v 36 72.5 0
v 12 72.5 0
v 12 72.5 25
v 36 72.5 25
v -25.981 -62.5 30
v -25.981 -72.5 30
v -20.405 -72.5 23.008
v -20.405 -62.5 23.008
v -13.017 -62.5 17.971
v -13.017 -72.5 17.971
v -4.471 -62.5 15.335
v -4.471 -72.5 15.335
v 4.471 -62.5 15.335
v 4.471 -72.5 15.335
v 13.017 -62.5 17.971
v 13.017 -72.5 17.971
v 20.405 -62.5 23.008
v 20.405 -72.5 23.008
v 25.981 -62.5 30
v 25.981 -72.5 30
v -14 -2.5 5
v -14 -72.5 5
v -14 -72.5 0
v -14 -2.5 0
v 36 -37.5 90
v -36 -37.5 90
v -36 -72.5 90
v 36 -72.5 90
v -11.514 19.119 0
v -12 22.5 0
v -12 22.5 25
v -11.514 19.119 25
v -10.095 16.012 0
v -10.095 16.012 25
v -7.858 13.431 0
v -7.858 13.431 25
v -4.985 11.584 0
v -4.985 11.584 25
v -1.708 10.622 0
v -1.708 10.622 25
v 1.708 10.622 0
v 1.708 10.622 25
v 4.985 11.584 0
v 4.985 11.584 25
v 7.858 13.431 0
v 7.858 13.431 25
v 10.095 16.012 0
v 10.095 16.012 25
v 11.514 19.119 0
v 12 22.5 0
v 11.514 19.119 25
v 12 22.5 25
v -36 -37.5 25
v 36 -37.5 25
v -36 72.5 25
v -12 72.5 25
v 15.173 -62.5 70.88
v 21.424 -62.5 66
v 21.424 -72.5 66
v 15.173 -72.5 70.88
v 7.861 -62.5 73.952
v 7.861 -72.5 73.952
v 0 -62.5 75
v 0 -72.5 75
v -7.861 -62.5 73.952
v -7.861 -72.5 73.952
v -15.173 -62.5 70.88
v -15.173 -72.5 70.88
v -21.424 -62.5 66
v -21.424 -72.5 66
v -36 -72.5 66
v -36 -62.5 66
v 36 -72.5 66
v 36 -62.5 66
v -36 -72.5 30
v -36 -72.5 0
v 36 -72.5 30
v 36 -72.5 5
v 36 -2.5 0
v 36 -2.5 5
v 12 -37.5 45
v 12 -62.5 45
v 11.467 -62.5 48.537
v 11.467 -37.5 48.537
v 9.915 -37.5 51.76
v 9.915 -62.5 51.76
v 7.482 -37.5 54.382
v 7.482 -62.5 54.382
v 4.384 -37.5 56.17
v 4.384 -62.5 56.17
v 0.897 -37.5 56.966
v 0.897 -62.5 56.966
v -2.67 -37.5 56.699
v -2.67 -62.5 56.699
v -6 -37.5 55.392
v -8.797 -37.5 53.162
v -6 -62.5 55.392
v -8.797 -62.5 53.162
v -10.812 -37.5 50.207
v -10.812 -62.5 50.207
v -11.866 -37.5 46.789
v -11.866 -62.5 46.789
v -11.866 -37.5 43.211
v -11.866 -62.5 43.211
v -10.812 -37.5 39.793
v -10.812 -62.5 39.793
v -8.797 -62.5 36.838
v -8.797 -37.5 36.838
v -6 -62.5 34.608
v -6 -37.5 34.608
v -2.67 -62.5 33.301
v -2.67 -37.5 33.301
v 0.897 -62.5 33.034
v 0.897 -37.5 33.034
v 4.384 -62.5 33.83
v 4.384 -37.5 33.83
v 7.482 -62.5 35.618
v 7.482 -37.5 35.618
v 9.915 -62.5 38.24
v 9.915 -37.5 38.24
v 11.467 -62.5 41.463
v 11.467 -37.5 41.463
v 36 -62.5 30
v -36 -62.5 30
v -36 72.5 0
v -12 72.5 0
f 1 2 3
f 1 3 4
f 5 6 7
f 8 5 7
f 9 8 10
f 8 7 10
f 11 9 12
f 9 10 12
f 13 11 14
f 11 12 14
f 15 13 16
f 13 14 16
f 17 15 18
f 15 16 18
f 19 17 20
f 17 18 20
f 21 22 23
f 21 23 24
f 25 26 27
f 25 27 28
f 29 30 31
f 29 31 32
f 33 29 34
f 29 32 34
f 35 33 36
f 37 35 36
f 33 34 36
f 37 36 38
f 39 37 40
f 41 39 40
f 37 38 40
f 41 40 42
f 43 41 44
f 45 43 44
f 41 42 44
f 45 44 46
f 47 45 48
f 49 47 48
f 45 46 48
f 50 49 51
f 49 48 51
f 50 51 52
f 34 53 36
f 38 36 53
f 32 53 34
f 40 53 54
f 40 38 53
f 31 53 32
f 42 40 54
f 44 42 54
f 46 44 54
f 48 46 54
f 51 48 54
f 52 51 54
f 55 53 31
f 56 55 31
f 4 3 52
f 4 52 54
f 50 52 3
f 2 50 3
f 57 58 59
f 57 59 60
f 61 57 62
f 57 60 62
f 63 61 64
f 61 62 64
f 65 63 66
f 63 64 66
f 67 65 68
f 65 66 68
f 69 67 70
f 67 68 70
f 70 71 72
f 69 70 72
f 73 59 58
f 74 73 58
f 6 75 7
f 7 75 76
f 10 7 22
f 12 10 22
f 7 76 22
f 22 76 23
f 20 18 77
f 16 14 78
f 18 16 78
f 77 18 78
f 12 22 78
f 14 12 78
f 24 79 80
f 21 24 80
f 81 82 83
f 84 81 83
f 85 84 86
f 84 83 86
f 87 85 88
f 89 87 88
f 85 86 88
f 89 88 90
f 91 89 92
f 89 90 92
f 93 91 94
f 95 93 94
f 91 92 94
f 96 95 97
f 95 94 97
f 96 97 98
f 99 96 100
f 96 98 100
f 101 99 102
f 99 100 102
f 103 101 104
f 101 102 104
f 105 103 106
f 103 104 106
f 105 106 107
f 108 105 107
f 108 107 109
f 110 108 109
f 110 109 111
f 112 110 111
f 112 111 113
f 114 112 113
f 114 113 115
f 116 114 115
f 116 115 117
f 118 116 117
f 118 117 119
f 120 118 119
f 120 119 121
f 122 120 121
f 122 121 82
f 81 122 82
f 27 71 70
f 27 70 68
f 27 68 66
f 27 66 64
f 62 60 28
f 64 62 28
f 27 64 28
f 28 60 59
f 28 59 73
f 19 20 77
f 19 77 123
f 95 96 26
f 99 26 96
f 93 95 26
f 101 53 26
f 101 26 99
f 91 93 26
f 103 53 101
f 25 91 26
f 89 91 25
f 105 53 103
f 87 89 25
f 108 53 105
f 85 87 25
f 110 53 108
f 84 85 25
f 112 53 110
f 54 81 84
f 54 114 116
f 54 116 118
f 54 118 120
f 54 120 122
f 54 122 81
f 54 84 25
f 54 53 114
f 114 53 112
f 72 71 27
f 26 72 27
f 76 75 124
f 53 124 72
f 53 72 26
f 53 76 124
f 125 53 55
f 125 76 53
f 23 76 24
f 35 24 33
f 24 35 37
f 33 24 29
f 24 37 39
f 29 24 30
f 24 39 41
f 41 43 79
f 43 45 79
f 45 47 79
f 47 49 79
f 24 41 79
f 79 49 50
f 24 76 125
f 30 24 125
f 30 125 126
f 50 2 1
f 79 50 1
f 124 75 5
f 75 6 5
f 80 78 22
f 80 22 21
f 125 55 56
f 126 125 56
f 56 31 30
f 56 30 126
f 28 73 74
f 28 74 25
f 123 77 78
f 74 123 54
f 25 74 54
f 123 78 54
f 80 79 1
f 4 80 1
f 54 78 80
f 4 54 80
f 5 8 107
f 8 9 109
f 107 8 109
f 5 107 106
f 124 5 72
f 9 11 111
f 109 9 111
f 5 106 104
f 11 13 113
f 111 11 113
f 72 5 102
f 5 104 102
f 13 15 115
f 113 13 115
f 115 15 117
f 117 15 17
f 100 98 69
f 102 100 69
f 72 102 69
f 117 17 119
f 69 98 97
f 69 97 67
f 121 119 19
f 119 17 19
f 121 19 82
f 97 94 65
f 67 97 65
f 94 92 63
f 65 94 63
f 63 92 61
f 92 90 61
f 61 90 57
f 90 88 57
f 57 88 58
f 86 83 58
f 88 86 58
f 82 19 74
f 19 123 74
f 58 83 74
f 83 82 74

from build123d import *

# Parameters (mm, degrees)
SKETCH_W        = 72
SKETCH_H        = 145
PAD_DEPTH       = 25
SKETCH001_W     = 72
SKETCH001_H     = 35
PAD001_DEPTH    = 65
SKETCH002_W     = 70
SKETCH002_H     = 18.58303
POCKET_DEPTH    = 50
POCKET001_DEPTH = 25.001
SKETCH004_R     = 12
POCKET002_DEPTH = 145.001
SKETCH005_R     = 30
POCKET003_DEPTH = 10
SKETCH006_W     = 22.449348
SKETCH006_H     = 36
POCKET004_DEPTH = 72.001


with BuildPart() as part:
    # Sketch → Pad (new body)
    with BuildSketch(Plane.XY):
        Rectangle(SKETCH_W, SKETCH_H)
    extrude(amount=PAD_DEPTH)

    # Sketch001 → Pad001 (new body)
    with BuildSketch(Plane.XY.offset(25)):
        with Locations((0, -55)):
            Rectangle(SKETCH001_W, SKETCH001_H)
    extrude(amount=PAD001_DEPTH)

    # Sketch002 → Pocket (cut)
    with BuildSketch(Plane.YZ.offset(36)):
        with Locations((-37.5, -4.291515)):
            Rectangle(SKETCH002_W, SKETCH002_H)
    extrude(amount=-POCKET_DEPTH, mode=Mode.SUBTRACT)

    # Sketch003 → Pocket001 (cut, through all)
    with BuildSketch(Plane.XY.offset(25)):
        with BuildLine():
            ThreePointArc((-12, 22.5), (0, 10.5), (12, 22.5))
            Line((12, 22.5), (12, 75.823228))
            ThreePointArc((12, 75.823228), (0, 87.823228), (-12, 75.823228))
            Line((-12, 22.5), (-12, 75.823228))
        make_face()
    extrude(amount=-POCKET001_DEPTH, mode=Mode.SUBTRACT)

    # Sketch004 → Pocket002 (cut, through all)
    with BuildSketch(Plane.XZ.offset(72.5)):
        with Locations((0, 45)):
            Circle(SKETCH004_R)
    extrude(amount=-POCKET002_DEPTH, mode=Mode.SUBTRACT)

    # Sketch005 → Pocket003 (cut)
    with BuildSketch(Plane.XZ.offset(72.5)):
        with Locations((0, 45)):
            Circle(SKETCH005_R)
    extrude(amount=-POCKET003_DEPTH, mode=Mode.SUBTRACT)

    # Sketch006 → Pocket004 (cut, through all)
    with BuildSketch(Plane.YZ.offset(36)):
        with Locations((-73.724674, 48)):
            Rectangle(SKETCH006_W, SKETCH006_H)
    extrude(amount=-POCKET004_DEPTH, mode=Mode.SUBTRACT)


solid = part.part
